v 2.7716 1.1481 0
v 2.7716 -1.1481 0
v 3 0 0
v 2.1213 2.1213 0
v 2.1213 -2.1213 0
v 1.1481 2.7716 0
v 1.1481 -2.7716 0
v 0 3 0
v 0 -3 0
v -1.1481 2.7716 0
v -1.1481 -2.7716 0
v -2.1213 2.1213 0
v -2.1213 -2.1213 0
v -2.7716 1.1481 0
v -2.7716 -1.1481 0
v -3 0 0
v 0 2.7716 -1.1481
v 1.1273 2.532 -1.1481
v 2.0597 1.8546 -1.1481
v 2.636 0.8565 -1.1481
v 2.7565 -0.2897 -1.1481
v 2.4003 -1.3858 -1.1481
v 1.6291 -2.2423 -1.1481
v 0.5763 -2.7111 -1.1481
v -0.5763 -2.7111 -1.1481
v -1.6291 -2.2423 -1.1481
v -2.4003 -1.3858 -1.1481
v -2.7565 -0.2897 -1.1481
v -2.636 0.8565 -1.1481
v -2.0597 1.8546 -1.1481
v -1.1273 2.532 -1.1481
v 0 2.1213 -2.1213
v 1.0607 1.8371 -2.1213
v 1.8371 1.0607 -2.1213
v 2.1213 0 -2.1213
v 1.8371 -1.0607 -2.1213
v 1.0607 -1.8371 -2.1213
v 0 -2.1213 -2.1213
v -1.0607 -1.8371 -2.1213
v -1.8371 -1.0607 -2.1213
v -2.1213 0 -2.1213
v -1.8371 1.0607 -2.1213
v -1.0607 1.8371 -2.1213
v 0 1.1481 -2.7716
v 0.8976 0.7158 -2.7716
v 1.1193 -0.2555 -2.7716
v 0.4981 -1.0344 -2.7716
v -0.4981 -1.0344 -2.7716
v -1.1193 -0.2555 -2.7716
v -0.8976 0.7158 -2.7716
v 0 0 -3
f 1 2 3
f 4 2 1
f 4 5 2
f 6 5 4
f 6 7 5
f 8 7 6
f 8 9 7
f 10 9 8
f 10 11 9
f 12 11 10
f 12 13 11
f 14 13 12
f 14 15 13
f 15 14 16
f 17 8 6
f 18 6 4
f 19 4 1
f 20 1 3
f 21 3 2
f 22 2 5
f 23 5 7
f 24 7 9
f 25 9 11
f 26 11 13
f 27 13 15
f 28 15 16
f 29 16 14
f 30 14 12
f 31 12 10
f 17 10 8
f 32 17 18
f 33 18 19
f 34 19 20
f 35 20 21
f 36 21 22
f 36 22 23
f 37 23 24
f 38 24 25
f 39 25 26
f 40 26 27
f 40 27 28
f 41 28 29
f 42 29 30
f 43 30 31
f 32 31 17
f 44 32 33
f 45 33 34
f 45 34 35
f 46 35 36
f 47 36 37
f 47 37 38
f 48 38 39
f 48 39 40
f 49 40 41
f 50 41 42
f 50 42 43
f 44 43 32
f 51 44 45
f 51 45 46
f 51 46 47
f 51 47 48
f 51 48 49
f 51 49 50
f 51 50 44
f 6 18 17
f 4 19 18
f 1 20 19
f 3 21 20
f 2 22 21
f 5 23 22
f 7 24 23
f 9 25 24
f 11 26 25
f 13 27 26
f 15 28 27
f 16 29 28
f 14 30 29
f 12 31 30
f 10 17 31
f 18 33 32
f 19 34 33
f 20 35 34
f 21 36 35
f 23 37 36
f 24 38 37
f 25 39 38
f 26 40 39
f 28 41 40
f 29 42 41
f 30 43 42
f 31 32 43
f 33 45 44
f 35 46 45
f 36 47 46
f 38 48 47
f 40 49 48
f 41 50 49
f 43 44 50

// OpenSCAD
function rotate_x(point, angle) = [
    point.x,
    point.y*cos(angle) - point.z*sin(angle),
    point.z*cos(angle) + point.y*sin(angle)
];
function rotate_x_around(point, angle, origin=[0, 0, 0]) =
    rotate_x(point - origin, angle) + origin;

function rotate_z(point, angle) = [
    point.x*cos(angle) - point.y*sin(angle),
    point.y*cos(angle) + point.x*sin(angle),
    point.z
];

function part_sums(seq) = [for (a = 0, i = 0; i <= len(seq);
                                a = a + seq[min(i, len(seq)-1)],
                                i = i + 1) a];

// Half sphere with optimized number of faces for faster minkowski sums
module half_sphere(r) {
    n = max(2, ceil(90 / $fa));
    da = 90 / n;
    n_points = concat([for (a = [0 : da : 89.9])
            max(3, ceil(cos(a) * 360 / $fa))
        ], [1]);
    points = [for (i = [0 : n]) each let (a = da * i, q = r * cos(a))
        [for (j = [0 : n_points[i] - 1]) let (b = 360 / n_points[i] * j)
            [q * sin(b), q * cos(b), -r * sin(a)]/*[i, j, a, b]*/
        ]
    ];

    face_top = [for (i = [0 : n_points[0] - 1]) i];

    offsets = part_sums(n_points);
    faces1 = [for (i = [0 : n - 1]) each let (
            o = offsets[i],
            ni = n_points[i],
            ni_1 = n_points[i + 1],
            ratio = ni_1 / ni
        )
        [for (j = [0 : ni - 1])
            [(j + 1) % ni + o, j + o,
             ni + round((j + 0.5) * ratio) % ni_1 + o]
        ]
    ];
    faces2 = [for (i = [0 : n - 2]) each let (
            o = offsets[i],
            ni = n_points[i]
        )
        [for (i = 0; i < ni; i = i + 1)
            if (faces1[i + o][2] != faces1[(i + 1) % ni + o][2])
                [faces1[i + o][2], faces1[(i + 1) % ni + o][2],
                 faces1[i + o][0]]
        ]
    ];
    
    faces = concat([face_top], faces1, faces2);
        
    polyhedron(points, faces);
}

half_sphere(3, $fa = 360 / 16);
